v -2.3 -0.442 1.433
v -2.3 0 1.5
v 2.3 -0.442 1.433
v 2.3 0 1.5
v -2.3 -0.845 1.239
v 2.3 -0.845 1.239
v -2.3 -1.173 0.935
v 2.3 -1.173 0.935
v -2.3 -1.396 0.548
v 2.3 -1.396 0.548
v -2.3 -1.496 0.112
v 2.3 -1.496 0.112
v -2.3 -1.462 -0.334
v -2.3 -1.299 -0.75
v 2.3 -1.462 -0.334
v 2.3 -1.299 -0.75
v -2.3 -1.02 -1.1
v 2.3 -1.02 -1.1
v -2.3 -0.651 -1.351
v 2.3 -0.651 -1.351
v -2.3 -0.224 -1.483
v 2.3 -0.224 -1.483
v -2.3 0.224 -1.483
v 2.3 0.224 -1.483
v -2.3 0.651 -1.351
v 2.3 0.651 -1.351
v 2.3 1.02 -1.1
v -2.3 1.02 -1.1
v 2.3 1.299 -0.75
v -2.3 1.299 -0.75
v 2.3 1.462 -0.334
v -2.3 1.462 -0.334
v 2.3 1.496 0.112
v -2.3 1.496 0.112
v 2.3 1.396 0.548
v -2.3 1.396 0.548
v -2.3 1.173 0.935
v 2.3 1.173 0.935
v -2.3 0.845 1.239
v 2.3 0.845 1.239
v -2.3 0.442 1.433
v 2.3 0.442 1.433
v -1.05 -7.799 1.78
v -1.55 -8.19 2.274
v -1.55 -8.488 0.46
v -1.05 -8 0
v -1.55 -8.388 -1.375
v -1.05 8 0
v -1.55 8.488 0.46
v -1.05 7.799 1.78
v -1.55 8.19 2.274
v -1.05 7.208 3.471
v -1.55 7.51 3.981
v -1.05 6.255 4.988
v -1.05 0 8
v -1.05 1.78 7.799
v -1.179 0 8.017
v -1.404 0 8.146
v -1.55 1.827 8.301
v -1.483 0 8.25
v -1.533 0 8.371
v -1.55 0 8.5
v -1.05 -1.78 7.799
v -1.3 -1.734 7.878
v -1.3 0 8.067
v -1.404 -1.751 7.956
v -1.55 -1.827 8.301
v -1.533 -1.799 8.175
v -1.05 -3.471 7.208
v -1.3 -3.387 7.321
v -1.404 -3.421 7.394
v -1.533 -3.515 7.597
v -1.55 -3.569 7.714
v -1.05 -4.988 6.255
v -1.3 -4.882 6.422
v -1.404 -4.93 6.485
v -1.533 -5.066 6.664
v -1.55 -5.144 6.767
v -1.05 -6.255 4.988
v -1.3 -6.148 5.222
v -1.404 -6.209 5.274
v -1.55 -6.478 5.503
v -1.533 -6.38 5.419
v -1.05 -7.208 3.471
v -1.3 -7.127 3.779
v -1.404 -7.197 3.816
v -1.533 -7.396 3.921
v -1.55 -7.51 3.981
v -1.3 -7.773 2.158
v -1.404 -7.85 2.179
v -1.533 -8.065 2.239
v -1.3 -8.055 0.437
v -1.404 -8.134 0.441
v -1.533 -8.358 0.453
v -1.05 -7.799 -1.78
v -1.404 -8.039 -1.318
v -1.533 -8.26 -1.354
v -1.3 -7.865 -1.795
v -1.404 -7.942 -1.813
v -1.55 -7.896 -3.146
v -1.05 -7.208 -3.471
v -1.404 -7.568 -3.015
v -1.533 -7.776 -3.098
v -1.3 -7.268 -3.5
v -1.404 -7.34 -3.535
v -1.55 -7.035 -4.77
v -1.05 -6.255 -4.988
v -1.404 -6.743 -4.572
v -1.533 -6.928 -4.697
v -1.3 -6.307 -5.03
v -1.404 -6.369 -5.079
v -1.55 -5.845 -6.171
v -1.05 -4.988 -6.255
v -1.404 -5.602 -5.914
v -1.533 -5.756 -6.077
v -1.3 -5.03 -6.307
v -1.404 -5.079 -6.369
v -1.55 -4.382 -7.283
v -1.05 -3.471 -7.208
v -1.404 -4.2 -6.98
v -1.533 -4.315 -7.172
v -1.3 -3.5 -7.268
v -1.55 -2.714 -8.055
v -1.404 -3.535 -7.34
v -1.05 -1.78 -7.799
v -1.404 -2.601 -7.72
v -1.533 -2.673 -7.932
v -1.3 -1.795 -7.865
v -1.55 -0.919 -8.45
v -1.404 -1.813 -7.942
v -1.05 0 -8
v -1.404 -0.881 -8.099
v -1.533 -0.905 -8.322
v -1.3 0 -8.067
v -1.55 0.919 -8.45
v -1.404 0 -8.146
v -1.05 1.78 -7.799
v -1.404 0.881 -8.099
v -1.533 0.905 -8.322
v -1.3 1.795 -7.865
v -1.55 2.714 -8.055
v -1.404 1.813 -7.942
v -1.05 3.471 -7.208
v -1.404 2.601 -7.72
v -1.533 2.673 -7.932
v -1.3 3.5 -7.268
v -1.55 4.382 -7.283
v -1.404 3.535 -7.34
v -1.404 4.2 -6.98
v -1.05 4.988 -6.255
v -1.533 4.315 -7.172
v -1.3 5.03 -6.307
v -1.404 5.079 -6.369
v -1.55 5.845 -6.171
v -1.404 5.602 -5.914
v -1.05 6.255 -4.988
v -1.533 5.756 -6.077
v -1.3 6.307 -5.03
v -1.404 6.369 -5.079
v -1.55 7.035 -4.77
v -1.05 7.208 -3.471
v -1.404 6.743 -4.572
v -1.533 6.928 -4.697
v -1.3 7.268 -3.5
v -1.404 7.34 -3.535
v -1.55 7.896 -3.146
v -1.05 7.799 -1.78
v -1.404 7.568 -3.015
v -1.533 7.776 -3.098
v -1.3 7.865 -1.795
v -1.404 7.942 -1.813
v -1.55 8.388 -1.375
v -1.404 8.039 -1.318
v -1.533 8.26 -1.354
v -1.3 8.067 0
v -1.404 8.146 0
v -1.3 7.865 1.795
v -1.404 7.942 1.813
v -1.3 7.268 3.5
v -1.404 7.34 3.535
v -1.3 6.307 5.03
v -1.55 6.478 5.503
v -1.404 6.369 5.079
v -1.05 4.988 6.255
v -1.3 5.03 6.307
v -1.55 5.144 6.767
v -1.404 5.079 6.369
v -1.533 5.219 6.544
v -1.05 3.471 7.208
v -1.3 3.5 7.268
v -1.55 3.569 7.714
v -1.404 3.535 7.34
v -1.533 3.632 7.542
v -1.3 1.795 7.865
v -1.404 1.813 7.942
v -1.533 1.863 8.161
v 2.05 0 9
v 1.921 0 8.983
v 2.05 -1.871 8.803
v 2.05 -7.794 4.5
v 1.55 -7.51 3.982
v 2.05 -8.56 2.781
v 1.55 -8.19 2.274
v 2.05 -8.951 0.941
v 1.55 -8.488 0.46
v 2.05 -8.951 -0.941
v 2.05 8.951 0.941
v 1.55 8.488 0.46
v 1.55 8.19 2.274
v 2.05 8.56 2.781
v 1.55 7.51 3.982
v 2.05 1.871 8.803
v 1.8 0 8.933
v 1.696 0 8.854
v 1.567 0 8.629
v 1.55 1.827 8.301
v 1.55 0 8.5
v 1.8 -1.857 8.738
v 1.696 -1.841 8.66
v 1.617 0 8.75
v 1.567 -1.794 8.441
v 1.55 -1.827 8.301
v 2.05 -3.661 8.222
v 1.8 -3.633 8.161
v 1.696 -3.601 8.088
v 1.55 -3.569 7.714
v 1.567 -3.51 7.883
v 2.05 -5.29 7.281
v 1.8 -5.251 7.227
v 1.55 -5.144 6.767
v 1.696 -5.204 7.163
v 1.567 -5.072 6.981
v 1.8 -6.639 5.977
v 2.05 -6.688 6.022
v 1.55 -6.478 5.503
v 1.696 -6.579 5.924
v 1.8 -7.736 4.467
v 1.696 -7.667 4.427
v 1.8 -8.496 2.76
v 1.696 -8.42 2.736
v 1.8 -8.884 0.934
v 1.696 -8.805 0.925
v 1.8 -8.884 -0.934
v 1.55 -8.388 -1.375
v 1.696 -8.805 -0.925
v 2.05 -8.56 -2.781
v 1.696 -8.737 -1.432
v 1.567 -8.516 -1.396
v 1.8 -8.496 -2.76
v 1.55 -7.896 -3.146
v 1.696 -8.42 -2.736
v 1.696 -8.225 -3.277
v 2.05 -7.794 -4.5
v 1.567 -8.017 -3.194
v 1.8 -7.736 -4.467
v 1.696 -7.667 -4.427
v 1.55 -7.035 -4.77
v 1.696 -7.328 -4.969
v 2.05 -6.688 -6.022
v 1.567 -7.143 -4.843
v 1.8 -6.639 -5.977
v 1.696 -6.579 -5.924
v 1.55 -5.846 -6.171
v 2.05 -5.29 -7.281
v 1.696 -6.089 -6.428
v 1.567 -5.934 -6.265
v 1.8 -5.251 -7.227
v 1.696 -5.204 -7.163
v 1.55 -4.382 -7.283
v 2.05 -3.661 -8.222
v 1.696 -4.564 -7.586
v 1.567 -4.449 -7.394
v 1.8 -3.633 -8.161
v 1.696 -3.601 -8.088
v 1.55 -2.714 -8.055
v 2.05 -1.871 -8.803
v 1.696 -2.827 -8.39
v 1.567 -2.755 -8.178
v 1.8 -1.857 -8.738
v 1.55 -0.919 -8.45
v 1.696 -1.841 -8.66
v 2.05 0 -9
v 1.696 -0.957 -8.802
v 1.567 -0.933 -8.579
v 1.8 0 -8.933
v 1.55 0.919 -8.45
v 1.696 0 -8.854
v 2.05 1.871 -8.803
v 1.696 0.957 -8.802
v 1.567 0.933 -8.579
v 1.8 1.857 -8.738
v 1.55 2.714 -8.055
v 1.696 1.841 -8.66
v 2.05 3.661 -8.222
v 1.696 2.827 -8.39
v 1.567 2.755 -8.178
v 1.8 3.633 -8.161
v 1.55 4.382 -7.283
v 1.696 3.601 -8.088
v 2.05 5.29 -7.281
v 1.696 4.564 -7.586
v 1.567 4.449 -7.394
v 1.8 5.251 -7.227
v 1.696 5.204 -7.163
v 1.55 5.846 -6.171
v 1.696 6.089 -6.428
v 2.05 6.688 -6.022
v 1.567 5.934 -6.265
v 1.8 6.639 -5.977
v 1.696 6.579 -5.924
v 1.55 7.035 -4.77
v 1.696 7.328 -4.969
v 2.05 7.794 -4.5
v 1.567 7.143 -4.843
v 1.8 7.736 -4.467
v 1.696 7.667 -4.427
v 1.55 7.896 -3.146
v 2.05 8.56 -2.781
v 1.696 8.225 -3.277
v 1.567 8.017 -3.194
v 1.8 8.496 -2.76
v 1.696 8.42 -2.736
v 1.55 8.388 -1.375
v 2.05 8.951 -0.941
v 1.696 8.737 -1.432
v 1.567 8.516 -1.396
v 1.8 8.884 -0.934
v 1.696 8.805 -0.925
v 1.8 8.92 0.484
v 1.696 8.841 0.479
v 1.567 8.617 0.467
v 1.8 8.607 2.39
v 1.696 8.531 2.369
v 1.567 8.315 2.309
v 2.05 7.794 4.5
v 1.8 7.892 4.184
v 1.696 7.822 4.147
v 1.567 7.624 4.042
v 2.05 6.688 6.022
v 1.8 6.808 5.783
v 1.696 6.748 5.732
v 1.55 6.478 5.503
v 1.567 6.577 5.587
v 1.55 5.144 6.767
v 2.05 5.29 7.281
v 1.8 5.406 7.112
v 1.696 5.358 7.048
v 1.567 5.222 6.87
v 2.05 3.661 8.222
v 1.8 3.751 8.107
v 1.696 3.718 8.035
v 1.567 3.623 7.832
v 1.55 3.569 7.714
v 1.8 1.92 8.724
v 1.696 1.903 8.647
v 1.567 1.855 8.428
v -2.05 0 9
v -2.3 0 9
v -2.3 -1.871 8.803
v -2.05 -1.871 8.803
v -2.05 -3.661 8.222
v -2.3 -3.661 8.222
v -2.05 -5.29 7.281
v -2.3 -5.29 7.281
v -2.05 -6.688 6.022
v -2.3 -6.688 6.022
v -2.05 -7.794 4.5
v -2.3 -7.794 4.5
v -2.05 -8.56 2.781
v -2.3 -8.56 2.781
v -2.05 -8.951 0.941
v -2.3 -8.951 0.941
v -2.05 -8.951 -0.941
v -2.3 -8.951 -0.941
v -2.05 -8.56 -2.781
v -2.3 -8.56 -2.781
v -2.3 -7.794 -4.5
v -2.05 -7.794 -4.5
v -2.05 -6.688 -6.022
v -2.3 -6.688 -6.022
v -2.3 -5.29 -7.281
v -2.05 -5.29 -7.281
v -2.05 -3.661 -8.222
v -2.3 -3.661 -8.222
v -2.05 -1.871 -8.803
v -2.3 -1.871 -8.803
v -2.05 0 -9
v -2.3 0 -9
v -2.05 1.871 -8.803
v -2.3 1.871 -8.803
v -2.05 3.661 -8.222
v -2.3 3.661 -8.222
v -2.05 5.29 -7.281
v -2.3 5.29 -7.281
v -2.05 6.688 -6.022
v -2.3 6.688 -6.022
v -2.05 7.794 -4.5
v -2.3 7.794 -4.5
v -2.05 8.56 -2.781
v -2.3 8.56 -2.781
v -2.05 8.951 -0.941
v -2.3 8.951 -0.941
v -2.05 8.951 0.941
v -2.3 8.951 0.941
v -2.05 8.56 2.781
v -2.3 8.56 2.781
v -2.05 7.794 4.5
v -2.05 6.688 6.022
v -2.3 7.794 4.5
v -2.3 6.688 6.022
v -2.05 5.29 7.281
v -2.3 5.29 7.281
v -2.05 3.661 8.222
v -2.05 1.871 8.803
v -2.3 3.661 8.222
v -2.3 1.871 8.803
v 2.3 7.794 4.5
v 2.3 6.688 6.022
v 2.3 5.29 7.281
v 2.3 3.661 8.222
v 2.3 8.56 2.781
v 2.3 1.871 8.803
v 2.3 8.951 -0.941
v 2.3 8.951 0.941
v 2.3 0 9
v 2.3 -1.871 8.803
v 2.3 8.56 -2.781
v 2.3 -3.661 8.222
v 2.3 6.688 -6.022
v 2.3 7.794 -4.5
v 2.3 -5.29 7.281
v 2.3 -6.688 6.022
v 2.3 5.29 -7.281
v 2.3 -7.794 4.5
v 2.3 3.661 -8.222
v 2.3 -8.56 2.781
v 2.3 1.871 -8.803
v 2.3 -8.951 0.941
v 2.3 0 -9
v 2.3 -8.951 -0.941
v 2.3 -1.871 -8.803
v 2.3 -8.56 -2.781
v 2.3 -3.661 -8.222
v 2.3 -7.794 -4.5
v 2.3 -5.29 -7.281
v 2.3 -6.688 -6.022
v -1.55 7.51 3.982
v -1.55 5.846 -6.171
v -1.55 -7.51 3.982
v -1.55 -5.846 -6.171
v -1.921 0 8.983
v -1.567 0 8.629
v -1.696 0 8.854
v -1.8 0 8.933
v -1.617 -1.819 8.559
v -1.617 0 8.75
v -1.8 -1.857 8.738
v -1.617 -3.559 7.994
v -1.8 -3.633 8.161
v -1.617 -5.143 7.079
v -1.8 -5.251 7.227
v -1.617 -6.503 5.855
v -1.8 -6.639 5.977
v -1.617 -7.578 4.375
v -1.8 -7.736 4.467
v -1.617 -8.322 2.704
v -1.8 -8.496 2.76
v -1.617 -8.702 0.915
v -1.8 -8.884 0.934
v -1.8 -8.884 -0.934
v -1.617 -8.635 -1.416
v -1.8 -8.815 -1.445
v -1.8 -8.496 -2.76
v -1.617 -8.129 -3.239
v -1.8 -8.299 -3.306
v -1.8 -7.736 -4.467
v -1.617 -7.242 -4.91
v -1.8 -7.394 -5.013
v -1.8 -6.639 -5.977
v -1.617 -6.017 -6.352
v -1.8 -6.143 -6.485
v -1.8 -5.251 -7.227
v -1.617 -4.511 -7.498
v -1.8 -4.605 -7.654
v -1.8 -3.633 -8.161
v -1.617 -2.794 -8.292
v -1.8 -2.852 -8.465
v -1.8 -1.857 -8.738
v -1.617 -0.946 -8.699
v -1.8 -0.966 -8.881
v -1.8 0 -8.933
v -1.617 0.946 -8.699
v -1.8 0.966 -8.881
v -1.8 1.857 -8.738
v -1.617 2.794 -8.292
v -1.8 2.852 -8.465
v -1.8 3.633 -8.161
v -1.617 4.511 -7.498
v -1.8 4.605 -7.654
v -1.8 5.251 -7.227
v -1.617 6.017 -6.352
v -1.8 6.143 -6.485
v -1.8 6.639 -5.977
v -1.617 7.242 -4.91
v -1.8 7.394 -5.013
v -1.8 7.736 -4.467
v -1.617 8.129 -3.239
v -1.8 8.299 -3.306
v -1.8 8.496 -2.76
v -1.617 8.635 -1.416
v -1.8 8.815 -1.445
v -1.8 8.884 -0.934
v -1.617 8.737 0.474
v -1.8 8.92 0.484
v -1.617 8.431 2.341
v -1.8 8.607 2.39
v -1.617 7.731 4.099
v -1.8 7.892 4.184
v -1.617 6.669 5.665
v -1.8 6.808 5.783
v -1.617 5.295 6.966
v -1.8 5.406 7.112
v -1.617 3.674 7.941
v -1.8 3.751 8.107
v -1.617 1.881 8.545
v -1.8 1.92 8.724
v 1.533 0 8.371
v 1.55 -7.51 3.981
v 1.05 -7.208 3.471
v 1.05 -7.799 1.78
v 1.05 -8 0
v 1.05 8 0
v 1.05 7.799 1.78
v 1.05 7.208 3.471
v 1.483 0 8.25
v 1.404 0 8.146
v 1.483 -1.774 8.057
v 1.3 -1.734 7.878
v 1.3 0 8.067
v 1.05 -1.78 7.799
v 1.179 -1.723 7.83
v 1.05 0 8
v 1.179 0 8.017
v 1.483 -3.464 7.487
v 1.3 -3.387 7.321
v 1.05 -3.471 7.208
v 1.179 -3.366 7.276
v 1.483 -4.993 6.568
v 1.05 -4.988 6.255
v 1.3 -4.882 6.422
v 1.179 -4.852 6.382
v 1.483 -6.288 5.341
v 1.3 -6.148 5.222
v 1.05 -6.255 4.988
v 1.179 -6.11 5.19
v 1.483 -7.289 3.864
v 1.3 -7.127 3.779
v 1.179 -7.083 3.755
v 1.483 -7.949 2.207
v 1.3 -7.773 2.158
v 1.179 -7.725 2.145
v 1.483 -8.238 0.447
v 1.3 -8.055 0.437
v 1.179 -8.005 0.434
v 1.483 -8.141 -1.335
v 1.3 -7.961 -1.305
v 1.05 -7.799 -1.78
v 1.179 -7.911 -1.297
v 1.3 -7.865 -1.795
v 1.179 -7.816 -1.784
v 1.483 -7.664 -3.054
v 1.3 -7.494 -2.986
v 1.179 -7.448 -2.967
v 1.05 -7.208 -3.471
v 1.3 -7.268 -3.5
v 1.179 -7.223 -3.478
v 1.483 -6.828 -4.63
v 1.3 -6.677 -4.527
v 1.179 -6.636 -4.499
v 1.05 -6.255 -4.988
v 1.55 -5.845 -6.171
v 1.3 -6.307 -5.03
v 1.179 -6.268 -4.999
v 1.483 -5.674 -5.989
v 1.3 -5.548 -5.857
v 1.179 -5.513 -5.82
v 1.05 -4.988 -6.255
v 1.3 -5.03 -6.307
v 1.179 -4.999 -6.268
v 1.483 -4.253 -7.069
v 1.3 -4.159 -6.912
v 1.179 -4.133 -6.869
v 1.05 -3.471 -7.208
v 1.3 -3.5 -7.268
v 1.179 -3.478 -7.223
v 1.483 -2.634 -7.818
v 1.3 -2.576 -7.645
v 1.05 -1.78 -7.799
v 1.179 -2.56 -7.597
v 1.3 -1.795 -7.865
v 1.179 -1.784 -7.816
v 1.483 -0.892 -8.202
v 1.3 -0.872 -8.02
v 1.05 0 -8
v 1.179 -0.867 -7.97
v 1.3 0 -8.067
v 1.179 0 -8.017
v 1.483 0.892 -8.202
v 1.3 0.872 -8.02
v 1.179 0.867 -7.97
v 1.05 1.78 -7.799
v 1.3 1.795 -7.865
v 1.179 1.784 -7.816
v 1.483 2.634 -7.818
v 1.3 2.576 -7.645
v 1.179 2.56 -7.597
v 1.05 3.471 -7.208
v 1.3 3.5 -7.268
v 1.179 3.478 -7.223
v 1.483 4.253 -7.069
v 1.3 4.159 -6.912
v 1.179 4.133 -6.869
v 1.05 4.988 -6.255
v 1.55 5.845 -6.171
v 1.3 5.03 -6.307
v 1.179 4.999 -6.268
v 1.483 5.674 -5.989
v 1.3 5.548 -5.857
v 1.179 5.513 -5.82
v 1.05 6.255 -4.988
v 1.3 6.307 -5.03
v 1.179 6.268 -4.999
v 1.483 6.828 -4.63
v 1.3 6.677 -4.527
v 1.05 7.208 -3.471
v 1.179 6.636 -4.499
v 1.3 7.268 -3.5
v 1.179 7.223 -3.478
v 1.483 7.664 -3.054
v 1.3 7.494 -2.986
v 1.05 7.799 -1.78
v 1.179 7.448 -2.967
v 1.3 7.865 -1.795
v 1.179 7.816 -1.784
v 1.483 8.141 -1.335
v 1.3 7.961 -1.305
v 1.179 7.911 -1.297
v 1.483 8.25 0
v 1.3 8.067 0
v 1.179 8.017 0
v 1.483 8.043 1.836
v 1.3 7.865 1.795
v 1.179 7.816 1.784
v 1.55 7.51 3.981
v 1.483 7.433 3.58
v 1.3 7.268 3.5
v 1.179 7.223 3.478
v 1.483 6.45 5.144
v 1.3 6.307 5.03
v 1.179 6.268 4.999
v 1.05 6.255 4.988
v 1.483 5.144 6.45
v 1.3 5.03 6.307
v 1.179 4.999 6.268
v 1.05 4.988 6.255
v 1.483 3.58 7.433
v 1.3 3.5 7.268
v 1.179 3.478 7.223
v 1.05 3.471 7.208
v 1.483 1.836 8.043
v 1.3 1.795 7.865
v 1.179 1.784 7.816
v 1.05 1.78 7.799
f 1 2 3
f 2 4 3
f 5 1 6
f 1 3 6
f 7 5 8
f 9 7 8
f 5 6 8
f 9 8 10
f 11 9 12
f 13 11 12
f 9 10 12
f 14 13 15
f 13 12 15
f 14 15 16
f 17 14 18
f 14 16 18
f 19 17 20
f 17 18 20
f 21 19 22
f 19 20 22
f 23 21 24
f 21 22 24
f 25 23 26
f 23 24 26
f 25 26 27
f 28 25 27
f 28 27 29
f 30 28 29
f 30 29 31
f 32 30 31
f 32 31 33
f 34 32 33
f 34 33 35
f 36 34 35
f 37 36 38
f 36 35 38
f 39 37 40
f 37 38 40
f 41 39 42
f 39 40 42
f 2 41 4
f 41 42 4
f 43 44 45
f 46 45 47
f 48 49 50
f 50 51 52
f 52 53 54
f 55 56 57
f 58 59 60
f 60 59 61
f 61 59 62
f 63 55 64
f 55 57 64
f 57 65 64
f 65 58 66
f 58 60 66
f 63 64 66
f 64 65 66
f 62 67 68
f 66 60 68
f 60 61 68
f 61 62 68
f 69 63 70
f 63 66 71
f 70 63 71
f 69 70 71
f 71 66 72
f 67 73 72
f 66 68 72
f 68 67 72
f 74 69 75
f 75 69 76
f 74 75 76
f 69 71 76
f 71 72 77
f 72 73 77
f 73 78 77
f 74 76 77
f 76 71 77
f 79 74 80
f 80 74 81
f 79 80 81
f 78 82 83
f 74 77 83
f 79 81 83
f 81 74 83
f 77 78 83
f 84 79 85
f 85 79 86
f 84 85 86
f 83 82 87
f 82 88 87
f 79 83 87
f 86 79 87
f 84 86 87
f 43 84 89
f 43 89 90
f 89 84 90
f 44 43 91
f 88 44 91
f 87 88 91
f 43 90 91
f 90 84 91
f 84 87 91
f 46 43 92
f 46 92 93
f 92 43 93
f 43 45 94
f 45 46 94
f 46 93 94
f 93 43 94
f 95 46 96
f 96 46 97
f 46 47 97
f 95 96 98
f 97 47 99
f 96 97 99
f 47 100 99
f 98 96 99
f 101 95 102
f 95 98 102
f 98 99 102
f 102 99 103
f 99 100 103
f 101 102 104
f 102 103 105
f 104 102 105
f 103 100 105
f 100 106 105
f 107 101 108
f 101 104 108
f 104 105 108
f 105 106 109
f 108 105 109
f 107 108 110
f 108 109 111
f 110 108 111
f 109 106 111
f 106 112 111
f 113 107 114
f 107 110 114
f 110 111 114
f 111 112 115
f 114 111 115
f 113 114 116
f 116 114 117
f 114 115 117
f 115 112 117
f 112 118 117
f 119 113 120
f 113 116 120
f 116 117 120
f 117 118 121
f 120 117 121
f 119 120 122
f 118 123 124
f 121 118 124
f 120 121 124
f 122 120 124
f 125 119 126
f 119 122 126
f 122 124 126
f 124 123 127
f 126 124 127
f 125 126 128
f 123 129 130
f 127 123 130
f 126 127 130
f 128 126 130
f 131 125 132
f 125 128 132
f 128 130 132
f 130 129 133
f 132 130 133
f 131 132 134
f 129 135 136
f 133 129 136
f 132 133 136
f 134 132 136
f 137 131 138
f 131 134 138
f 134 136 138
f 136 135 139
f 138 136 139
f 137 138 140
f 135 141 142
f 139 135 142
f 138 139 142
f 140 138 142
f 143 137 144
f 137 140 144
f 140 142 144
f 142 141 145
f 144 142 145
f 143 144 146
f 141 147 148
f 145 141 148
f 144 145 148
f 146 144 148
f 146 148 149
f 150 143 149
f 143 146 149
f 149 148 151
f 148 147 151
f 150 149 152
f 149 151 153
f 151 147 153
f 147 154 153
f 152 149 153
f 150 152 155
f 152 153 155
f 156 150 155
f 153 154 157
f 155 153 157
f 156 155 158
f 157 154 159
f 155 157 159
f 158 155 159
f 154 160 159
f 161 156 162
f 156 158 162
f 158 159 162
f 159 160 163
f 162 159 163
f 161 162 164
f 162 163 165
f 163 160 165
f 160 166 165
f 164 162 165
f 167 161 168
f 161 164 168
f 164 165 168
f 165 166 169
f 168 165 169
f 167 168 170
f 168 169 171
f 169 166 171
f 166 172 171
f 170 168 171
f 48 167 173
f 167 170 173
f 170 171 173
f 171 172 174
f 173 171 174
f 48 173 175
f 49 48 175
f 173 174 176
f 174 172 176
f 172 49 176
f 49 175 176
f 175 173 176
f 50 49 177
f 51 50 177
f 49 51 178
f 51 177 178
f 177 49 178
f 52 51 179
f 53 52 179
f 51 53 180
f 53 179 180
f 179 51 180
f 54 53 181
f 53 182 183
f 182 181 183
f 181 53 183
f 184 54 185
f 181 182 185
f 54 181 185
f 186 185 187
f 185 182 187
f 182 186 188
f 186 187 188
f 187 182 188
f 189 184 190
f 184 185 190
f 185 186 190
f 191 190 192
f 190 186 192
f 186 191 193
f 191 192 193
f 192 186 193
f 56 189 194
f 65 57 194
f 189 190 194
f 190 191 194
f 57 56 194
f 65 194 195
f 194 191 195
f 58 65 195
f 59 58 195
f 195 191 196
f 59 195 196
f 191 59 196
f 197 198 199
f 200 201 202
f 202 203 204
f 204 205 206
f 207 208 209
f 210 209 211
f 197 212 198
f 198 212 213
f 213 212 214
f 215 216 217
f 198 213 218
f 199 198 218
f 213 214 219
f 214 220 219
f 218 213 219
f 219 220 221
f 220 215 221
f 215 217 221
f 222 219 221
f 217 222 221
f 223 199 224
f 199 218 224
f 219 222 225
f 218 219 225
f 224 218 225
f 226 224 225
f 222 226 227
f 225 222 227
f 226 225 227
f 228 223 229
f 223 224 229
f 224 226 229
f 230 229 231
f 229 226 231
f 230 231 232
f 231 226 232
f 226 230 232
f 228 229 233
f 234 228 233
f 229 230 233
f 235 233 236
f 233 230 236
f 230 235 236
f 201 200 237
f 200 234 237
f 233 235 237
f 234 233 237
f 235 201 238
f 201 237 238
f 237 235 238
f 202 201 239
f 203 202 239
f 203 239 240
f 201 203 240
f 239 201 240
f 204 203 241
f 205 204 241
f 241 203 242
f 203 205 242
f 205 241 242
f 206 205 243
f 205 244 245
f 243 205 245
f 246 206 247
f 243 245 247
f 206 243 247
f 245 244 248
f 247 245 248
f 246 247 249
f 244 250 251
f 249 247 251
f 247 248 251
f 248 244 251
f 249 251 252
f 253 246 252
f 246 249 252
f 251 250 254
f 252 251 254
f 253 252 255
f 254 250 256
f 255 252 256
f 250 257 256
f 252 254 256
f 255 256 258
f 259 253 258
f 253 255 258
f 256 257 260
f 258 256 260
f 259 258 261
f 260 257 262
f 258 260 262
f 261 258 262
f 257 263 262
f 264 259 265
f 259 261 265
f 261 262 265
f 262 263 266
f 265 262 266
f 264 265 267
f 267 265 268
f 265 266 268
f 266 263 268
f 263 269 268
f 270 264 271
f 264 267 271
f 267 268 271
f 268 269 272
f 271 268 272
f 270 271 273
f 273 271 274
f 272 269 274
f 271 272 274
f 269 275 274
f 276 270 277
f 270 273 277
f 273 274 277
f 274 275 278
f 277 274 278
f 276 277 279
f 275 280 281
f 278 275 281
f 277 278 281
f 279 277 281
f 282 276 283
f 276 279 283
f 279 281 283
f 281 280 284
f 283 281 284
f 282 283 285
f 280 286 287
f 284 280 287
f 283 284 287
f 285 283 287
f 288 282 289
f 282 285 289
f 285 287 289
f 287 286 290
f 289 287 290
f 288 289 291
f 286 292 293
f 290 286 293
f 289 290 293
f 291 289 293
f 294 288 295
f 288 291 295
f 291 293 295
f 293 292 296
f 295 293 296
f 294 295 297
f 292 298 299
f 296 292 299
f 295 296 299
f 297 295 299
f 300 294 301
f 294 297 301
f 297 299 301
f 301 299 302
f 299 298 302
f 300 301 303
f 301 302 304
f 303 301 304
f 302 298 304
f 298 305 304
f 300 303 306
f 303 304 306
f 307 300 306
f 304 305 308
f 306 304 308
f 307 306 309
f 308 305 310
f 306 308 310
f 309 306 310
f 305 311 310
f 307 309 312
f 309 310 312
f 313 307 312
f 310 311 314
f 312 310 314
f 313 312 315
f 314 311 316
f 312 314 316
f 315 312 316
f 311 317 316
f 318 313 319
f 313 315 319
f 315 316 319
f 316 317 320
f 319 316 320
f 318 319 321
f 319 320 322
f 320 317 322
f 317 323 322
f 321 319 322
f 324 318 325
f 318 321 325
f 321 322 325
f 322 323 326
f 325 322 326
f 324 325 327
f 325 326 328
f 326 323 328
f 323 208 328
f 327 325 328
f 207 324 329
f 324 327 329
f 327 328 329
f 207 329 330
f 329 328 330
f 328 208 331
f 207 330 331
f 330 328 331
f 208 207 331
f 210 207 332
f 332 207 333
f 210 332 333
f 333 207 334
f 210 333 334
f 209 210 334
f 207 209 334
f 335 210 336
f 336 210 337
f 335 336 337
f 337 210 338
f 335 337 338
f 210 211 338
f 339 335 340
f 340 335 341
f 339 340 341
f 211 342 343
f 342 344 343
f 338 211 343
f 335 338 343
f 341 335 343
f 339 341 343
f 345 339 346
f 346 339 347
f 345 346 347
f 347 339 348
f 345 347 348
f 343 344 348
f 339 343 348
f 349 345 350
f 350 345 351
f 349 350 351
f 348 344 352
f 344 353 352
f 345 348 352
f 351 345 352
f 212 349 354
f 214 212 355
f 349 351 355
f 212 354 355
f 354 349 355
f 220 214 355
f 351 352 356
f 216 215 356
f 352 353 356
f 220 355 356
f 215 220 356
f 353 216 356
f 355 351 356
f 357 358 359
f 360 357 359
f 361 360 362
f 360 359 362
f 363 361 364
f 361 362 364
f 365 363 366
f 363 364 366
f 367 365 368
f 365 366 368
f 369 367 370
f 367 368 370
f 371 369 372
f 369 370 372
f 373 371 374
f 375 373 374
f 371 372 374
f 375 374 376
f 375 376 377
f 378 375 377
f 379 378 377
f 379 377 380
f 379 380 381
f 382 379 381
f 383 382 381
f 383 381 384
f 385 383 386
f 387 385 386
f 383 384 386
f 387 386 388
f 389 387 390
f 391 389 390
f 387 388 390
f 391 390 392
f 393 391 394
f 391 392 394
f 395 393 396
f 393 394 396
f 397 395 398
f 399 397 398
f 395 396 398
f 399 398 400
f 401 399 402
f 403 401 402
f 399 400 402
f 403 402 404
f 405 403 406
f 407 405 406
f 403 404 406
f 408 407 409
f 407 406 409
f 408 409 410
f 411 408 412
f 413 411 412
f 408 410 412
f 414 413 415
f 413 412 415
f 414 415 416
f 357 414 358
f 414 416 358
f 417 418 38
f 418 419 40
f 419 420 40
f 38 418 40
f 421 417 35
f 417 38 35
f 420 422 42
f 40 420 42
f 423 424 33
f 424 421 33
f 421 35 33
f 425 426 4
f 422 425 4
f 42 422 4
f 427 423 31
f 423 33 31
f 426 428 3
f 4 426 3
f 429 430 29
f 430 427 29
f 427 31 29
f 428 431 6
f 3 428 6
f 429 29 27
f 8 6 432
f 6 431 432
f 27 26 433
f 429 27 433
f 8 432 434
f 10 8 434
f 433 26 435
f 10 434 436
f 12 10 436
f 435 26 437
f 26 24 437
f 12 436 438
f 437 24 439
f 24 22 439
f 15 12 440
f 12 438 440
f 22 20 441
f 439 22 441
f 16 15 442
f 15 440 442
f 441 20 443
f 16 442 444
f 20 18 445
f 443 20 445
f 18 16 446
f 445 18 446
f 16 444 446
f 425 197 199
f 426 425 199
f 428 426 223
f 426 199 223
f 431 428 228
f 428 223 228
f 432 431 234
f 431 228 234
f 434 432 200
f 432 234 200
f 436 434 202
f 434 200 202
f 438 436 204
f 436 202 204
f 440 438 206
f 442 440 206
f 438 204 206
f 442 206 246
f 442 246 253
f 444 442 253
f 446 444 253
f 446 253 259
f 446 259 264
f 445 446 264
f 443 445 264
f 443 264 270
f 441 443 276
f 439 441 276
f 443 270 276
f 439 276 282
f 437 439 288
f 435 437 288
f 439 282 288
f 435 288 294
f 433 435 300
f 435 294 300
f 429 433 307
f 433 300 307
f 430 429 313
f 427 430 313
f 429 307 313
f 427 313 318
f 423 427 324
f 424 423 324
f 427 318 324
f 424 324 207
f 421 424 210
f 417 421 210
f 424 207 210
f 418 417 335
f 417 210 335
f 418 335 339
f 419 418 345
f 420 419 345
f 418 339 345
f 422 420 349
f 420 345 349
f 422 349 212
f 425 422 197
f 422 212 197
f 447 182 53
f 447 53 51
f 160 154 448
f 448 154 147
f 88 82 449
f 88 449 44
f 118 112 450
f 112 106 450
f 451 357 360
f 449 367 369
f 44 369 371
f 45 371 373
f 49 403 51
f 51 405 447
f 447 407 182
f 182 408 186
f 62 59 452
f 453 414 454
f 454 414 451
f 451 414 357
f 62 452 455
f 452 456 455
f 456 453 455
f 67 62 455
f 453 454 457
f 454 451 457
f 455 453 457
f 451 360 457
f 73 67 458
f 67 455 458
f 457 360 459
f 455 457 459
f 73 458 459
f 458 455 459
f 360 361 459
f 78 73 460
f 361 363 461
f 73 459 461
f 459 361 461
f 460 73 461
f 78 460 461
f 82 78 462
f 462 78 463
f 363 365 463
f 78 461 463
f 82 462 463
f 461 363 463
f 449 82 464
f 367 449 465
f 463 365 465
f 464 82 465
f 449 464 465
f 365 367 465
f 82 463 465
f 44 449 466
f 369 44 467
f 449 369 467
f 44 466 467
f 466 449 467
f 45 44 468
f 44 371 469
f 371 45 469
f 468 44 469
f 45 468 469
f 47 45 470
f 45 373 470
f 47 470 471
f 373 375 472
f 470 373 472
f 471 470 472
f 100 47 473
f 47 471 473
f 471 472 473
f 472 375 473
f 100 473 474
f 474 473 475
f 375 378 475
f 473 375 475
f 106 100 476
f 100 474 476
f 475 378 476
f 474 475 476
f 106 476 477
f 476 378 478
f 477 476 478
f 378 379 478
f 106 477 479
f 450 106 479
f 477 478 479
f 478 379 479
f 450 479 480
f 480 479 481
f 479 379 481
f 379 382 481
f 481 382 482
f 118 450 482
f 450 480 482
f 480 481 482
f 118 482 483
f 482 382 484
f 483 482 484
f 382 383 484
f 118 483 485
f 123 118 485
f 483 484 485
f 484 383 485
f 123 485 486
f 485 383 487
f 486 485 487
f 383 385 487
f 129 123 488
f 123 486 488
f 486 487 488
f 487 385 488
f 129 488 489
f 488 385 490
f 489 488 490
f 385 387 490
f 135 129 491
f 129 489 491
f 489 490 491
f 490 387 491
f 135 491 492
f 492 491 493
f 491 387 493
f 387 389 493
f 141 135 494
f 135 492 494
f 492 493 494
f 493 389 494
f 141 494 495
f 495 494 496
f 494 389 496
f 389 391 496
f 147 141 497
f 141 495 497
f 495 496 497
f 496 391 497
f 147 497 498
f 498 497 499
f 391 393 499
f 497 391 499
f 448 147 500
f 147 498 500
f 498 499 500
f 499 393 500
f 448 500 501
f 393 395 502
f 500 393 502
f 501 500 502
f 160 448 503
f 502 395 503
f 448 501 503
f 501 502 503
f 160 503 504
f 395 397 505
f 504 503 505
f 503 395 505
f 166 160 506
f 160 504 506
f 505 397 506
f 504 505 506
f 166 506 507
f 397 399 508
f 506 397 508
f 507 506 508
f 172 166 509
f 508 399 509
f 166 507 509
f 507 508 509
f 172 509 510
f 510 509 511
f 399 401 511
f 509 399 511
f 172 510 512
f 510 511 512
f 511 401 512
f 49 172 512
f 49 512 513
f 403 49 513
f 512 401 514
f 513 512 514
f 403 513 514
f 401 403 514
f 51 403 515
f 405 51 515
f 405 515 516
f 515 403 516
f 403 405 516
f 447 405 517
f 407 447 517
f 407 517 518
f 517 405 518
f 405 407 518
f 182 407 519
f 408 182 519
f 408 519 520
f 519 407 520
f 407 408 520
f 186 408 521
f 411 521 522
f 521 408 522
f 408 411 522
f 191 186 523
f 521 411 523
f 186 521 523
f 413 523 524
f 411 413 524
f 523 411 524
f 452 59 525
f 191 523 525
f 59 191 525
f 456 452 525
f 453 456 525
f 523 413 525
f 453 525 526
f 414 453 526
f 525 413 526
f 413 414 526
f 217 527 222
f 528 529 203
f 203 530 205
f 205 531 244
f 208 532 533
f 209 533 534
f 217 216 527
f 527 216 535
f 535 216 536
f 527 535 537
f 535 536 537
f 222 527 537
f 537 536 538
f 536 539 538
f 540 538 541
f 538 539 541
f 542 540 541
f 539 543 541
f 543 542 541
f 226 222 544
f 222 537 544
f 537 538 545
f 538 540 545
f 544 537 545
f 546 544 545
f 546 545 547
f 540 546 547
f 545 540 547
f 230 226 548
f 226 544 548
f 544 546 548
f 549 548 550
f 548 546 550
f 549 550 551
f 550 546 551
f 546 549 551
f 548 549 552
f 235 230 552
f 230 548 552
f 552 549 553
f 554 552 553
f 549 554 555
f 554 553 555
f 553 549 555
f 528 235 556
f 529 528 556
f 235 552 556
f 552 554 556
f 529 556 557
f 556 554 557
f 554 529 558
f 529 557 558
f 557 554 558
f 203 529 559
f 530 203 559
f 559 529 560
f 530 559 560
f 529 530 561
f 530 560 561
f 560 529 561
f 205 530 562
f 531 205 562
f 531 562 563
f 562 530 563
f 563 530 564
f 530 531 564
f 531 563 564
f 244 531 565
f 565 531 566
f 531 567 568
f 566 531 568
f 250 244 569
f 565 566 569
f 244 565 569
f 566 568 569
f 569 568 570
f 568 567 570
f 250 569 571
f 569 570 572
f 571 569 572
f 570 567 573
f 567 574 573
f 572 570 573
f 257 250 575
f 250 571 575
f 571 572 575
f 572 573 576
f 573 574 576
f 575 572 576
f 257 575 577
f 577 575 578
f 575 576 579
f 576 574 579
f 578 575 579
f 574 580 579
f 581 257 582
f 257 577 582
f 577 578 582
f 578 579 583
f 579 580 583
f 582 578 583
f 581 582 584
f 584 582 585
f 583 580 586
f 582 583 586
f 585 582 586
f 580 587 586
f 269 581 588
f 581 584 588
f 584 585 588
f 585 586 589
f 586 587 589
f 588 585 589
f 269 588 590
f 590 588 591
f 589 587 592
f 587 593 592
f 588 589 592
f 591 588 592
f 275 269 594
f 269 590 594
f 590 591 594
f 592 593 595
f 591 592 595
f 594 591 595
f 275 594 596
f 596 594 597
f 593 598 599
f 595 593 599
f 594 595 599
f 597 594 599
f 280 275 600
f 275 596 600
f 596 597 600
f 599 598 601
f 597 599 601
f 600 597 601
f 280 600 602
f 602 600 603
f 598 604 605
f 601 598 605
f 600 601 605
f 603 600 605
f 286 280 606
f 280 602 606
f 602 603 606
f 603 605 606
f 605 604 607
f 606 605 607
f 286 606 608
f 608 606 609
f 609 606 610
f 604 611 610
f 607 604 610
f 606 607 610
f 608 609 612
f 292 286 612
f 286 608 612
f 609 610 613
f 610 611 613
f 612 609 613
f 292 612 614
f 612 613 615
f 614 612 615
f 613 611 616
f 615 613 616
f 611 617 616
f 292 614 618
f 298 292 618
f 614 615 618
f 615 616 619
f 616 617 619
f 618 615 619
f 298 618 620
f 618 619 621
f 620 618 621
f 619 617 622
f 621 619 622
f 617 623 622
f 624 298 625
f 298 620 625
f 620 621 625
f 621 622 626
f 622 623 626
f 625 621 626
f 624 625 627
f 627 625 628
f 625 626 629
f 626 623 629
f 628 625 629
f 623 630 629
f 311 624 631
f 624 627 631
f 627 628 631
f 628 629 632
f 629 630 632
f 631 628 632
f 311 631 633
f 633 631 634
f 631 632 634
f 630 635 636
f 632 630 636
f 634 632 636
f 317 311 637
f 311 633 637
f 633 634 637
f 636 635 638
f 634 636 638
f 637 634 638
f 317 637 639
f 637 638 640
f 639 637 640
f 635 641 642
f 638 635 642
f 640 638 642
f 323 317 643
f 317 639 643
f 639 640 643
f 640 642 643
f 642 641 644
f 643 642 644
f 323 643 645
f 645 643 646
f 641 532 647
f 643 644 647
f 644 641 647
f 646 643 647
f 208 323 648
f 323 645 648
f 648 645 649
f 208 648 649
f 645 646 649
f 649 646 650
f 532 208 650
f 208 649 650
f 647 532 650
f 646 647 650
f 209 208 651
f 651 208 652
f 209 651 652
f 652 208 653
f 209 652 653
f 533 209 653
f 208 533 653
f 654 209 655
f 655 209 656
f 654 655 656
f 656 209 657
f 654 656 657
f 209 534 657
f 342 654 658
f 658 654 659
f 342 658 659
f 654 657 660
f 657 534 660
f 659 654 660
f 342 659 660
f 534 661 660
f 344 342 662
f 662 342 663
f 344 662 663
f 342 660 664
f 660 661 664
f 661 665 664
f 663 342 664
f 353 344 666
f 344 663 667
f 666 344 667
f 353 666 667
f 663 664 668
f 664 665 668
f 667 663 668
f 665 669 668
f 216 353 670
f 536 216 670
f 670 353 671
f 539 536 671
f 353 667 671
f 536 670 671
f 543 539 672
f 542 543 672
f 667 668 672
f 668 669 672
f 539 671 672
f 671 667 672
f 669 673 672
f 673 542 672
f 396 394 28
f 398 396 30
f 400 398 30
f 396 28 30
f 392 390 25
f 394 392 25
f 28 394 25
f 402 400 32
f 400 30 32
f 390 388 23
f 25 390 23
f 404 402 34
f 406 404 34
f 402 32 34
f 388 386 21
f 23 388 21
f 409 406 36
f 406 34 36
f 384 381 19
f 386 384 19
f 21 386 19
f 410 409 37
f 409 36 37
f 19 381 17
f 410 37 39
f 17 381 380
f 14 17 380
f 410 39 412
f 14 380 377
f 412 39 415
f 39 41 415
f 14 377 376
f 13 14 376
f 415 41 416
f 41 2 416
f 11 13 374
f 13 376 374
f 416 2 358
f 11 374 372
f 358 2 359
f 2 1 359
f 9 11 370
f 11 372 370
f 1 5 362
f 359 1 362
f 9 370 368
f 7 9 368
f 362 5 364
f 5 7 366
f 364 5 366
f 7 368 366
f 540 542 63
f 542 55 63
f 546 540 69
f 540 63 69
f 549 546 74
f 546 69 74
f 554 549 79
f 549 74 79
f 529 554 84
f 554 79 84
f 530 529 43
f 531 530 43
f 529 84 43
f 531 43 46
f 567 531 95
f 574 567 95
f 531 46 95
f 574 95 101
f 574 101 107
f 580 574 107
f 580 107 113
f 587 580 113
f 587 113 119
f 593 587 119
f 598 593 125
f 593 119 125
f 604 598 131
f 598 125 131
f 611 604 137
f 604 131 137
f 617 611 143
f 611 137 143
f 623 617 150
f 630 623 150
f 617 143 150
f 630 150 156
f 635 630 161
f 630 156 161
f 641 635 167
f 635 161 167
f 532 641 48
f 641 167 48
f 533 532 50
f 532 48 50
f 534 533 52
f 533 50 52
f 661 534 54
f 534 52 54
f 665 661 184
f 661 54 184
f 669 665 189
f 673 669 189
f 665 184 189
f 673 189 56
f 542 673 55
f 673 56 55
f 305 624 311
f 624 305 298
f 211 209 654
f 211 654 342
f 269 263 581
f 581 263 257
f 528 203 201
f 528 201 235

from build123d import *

# Parameters (mm, degrees)
FILLET1_R = 0.5


with BuildPart() as part:
    # Sketch1 → Revolve1 (revolve)
    with BuildSketch(Plane.XY, mode=Mode.PRIVATE) as revolve1_sk:
        with BuildLine():
            Line((-2.3, 1.5), (2.3, 1.5))
            Line((2.3, 1.5), (2.3, 9))
            Line((2.3, 9), (1.55, 9))
            Line((1.55, 9), (1.55, 8.5))
            ThreePointArc((1.55, 8.5), (1.403553391, 8.146446609), (1.05, 8))
            Line((1.05, 8), (-1.05, 8))
            ThreePointArc((-1.05, 8), (-1.403553391, 8.146446609), (-1.55, 8.5))
            Line((-1.55, 8.5), (-1.55, 9))
            Line((-1.55, 9), (-2.3, 9))
            Line((-2.3, 9), (-2.3, 1.5))
        make_face()
    revolve(revolve1_sk.sketch.rotate(Axis((0, 0, 0), (1, 0, 0)), 90), axis=Axis((0, 0, 0), (1, 0, 0)))

    # Fillet1
    fillet1_edges = [part.edges().sort_by_distance(p)[0] for p in [
        (1.55, 0, -9),
        (-1.55, 0, -9),
    ]]
    fillet(fillet1_edges, radius=FILLET1_R - 0.0001)  # a hair under: the kernel refuses the full size


solid = part.part
